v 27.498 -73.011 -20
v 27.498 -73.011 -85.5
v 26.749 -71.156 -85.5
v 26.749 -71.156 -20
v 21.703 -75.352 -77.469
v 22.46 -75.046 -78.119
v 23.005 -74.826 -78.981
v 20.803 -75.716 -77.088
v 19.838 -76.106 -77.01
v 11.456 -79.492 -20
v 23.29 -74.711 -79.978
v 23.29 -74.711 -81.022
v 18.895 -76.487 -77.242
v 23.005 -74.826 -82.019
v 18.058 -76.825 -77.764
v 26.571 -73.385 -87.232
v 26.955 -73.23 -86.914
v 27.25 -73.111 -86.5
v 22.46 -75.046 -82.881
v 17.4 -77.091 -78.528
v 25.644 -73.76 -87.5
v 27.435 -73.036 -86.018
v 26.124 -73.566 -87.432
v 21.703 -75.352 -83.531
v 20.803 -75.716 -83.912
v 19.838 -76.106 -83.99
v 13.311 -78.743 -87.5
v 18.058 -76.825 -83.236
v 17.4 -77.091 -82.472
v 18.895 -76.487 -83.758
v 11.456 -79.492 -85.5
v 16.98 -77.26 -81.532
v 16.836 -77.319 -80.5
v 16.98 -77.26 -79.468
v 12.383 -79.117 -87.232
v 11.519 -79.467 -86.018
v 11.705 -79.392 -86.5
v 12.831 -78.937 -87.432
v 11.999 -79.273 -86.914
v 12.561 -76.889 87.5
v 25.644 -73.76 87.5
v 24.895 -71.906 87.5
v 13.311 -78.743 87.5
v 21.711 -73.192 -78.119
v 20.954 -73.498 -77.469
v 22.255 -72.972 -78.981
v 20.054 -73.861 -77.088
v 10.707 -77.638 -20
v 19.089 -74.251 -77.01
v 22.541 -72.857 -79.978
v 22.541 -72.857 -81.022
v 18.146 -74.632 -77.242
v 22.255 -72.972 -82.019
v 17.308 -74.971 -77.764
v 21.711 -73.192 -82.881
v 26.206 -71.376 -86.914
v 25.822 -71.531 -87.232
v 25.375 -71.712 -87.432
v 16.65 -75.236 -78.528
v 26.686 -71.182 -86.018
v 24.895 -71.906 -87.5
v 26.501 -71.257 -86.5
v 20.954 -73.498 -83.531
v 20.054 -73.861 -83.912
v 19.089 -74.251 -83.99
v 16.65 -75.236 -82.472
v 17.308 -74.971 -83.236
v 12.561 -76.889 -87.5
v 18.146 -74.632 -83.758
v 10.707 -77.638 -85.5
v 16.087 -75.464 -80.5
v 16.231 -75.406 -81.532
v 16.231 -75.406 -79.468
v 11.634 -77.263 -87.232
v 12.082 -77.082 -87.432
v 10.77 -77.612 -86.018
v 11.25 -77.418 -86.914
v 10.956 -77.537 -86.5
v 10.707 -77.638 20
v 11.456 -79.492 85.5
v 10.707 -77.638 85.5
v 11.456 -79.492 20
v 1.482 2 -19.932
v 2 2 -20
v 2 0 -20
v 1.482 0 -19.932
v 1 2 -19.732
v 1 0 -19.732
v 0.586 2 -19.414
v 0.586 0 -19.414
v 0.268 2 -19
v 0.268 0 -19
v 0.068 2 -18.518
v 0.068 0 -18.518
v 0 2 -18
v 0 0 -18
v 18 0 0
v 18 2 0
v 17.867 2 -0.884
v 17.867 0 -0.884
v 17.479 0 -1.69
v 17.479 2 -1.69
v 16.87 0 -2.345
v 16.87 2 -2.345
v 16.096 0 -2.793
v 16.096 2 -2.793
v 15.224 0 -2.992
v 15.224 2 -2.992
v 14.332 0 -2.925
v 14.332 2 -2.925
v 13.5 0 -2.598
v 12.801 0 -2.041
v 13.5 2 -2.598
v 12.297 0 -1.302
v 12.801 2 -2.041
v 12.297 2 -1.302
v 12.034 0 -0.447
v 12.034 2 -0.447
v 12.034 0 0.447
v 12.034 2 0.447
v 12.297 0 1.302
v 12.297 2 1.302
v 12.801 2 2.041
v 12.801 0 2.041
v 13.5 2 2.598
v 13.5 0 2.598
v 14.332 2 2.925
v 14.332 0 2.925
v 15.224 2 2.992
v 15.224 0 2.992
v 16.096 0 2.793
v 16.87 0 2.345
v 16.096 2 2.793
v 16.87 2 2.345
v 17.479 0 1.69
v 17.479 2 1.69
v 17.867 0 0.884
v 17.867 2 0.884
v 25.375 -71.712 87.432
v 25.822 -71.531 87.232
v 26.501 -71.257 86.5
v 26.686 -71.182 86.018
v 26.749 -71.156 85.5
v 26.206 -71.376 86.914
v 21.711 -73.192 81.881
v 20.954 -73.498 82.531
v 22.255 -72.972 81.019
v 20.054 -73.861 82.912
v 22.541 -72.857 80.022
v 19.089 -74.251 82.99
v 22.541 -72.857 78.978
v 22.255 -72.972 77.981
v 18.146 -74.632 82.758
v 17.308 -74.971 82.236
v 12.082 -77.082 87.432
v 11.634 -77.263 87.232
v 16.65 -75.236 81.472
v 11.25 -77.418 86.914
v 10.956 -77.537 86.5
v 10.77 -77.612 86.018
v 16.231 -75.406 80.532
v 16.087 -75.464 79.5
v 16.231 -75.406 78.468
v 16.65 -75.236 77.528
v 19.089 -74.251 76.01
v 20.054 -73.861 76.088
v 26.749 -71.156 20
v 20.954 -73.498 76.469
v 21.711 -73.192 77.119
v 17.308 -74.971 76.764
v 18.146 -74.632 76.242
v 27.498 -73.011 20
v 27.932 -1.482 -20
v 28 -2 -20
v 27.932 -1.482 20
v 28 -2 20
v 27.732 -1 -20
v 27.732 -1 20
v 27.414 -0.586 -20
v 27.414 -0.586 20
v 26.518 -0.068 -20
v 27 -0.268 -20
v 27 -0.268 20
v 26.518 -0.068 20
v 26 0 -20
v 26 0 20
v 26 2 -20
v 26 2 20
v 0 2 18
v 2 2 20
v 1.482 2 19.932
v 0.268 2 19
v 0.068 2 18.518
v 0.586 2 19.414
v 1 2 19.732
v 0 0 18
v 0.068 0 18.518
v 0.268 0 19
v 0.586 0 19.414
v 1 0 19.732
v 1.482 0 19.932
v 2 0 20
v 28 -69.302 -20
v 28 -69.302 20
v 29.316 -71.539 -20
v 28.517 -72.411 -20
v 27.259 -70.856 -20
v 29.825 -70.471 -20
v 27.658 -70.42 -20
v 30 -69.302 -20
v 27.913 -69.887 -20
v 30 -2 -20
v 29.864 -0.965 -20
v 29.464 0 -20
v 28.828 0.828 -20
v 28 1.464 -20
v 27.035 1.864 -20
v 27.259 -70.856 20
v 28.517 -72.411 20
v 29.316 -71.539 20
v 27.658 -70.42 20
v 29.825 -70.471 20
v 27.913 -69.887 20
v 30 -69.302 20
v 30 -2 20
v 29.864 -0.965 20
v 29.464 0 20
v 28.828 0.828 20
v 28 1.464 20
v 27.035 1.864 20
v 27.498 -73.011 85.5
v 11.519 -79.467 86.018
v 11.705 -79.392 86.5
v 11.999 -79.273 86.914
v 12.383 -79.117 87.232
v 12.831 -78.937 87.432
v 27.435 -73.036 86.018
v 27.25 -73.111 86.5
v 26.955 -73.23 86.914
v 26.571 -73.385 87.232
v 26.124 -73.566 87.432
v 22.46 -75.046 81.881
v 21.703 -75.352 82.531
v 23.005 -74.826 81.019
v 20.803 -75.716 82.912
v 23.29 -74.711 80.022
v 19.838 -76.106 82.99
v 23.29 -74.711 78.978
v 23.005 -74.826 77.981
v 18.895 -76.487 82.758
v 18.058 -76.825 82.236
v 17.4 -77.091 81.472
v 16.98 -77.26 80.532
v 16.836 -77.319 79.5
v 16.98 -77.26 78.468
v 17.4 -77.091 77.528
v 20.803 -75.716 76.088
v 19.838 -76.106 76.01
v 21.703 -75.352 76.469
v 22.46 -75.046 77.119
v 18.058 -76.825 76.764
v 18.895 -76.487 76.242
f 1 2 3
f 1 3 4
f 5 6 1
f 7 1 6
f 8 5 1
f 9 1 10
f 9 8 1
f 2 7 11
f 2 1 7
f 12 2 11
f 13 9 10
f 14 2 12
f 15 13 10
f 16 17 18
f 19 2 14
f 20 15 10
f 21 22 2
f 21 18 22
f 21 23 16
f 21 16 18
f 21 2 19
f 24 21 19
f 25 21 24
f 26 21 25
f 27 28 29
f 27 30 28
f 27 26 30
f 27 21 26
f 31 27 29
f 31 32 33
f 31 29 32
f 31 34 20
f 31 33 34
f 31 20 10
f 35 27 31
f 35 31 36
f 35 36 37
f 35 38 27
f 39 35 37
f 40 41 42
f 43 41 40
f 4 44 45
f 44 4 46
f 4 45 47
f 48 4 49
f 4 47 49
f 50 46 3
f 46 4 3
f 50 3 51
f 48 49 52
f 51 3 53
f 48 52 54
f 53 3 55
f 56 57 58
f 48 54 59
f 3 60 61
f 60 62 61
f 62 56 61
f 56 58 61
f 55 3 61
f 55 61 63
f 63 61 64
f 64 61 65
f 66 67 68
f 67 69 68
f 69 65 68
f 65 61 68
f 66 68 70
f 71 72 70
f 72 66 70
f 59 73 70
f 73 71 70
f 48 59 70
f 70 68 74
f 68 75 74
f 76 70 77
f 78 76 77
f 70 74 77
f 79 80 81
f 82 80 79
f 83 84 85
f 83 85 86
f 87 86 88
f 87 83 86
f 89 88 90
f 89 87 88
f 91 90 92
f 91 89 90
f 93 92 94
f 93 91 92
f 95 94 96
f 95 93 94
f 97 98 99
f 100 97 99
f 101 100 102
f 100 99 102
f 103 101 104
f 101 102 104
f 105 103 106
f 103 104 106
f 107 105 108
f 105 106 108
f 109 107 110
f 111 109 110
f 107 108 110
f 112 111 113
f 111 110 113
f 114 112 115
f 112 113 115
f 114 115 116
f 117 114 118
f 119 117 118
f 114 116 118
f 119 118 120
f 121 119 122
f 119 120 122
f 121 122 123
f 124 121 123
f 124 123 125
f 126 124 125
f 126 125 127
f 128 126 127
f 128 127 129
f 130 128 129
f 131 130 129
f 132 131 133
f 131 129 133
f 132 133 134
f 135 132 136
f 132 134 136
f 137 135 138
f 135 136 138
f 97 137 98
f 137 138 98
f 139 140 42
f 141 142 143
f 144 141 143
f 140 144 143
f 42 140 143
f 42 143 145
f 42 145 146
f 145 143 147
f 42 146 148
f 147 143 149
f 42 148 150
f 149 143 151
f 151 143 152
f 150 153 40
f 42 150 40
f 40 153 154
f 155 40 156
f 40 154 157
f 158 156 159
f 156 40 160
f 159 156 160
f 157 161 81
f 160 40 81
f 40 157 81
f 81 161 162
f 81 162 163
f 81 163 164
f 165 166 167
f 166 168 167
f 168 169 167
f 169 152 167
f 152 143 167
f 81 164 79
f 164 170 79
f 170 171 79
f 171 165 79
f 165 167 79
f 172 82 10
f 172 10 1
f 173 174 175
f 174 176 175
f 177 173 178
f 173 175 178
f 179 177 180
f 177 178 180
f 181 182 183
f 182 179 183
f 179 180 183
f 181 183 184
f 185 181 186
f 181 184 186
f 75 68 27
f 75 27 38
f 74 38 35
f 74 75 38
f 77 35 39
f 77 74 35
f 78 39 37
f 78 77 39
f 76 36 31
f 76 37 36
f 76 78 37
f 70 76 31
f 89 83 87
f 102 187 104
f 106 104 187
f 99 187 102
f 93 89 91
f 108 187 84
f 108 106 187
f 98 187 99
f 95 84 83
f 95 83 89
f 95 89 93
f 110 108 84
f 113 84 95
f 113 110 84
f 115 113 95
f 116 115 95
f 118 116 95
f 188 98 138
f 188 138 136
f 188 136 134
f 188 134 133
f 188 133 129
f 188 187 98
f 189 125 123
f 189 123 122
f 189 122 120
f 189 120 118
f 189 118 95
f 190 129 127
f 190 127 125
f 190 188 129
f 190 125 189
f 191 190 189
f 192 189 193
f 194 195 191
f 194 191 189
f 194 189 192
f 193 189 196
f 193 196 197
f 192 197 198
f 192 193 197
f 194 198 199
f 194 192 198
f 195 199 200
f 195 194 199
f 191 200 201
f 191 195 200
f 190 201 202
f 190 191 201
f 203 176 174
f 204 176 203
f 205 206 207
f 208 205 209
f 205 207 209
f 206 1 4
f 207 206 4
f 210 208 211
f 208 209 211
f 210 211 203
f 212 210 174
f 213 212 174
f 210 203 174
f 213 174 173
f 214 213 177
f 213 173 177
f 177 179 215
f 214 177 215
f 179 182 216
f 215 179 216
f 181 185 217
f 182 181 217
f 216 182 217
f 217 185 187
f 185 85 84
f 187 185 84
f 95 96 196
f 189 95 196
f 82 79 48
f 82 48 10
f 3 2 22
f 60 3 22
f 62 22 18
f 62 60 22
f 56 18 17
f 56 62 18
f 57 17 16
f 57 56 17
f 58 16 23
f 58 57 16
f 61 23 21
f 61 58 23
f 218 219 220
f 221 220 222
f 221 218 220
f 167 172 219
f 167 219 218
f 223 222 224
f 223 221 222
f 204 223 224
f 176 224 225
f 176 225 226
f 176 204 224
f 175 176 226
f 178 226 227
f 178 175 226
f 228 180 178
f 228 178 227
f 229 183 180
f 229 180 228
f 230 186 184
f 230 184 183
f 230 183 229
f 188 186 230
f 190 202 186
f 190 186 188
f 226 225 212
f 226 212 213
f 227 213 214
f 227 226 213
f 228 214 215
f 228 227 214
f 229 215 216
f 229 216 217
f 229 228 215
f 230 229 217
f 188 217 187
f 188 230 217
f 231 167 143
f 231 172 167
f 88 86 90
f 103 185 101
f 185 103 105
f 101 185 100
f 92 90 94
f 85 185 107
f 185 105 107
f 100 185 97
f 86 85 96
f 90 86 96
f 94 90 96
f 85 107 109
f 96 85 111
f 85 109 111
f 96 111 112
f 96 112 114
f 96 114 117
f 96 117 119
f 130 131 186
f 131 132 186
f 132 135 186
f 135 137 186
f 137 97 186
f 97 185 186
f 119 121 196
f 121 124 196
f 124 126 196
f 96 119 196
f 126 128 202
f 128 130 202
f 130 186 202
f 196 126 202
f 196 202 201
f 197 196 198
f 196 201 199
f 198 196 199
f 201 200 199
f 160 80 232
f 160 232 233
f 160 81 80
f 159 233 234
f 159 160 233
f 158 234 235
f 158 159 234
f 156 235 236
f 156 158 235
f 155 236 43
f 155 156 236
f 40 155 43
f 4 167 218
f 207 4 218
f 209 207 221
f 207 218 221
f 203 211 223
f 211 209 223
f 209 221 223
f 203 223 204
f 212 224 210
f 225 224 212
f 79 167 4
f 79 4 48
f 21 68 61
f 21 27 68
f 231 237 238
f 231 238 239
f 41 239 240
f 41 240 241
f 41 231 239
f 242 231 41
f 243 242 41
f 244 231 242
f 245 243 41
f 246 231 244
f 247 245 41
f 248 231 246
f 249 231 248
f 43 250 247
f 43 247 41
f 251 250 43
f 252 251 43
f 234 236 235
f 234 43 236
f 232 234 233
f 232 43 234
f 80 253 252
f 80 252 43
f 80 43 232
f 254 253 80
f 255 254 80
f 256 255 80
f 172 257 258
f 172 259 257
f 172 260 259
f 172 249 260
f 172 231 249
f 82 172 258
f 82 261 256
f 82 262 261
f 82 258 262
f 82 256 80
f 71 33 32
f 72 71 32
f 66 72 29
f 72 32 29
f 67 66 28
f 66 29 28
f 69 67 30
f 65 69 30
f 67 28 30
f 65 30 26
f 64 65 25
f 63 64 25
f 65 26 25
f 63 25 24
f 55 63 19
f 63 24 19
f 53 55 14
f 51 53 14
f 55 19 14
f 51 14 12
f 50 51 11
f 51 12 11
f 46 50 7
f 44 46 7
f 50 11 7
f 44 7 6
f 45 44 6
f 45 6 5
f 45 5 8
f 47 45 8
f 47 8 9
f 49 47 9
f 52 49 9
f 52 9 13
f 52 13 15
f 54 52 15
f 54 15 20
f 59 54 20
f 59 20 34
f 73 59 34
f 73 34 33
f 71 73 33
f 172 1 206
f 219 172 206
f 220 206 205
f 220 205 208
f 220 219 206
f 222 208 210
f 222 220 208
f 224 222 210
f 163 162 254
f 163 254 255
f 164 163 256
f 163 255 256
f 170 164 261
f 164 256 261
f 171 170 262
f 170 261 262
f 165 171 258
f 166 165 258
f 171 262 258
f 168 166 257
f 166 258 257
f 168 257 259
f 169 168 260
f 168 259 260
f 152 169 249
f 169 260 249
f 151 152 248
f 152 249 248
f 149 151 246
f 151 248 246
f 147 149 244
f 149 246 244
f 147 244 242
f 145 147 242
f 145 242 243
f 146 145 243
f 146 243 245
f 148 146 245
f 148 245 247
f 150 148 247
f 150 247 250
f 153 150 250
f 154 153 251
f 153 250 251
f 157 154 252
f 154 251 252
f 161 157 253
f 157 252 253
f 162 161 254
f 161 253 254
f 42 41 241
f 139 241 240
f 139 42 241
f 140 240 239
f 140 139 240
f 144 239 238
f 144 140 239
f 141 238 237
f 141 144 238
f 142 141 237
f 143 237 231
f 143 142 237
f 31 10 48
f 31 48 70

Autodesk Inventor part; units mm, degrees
ref_plane "YZ Plane" through (0, 0, 0) normal (1, 0, 0) x (0, 1, 0)
ref_plane "XZ Plane" through (0, 0, 0) normal (0, 1, 0) x (-1, 0, 0)
ref_plane "XY Plane" through (0, 0, 0) normal (0, 0, 1) x (1, 0, 0)
sketch "Sketch1" plane through (0, 0, 0) normal (0, 1, 0) x (-1, 0, 0)
  line L0 (0, 20) -> (-30, 20)
  line L1 (-30, 20) -> (-30, -20)
  line L2 (-30, -20) -> (0, -20)
  line L3 (0, -20) -> (0, 20)
  point P0 (0, 0)
  dimension "d0" = 20
  dimension "d1" = 20
  dimension "d2" = 0
  dimension "d3" = 30
extrude "Plate1" add sketch "Sketch1" along normal blind 2
sketch "Sketch2" plane through (28, 2, -20) normal (1, 0, 0) x (0, -1, 0)
  line L0 (0, 40) -> (0, 0)
  line L1 (0, 0) -> (74, 0)
  line L2 (74, 0) -> (74, 40)
  line L3 (74, 40) -> (0, 40)
edge flange "Flange1" height 74 angle -90 thickness 2 bend radius 2 thickness toward (1, 0, 0) relief tear relief width 2 relief depth 1 edges at (30, 2, 0) wall of the first edge with corners at (28, 2, 20) (28, 2, -20) (28, -72, -20) (28, -72, 20)
bend "Bend1"
corner "Corner1"
sketch "Sketch3" plane through (29.2508, -70.1456, 20) normal (0.3746066, -0.9271839, 0) x (0.9271839, 0.3746066, 0)
  line L0 (0, -40) -> (0, 0)
  line L1 (0, 0) -> (-20, 0)
  line L2 (-20, 0) -> (-20, -40)
  line L3 (-20, -40) -> (0, -40)
edge flange "Flange2" height 20 angle 68 thickness 2 bend radius 2 thickness toward (0.3746066, -0.9271839, 0) relief tear relief width 2 relief depth 1 edges at (28, -72, 0) wall of the first edge with corners at (29.2508, -70.1456, -20) (29.2508, -70.1456, 20) (10.7071, -77.6378, 20) (10.7071, -77.6378, -20)
bend "Bend2"
corner "Corner2"
sketch "Sketch4" plane through (11.4563, -79.4921, 20) normal (0.3746066, -0.9271839, 0) x (-0.9271839, -0.3746066, 0)
  line L0 (-17.302, 40) -> (-17.302, 0) projected
  line L1 (0, 0) -> (-17.302, 0) projected
  line L2 (0, 40) -> (0, 0) projected
  line L3 (-17.302, 40) -> (0, 40) projected
  line L4 (-17.302, -67.5) -> (0, -67.5)
  line L5 (0, -67.5) -> (0, 107.5)
  line L6 (0, 107.5) -> (-17.302, 107.5)
  line L7 (-17.302, 107.5) -> (-17.302, -67.5)
  point P0 (-19.1562, 20)
  dimension "d26" = 87.5
  dimension "d27" = 87.5
  dimension "d28" = 0
  dimension "d30" = 0
extrude "Extrusion1" add sketch "Sketch4" against normal blind 2 contours L7 L6 L5 L3 | L1 L5 L4 L7
sketch "Sketch5" plane through (0, 2, 0) normal (0, 1, 0) x (1, 0, 0)
  circle A0 centre (15, 0) radius 3
  line L0 (36, 0) -> (-6, 0) projected
  point P0 (0, 0)
  dimension "d51" = 6
  dimension "d52" = 0
  dimension "d53" = 15
extrude "Extrusion2" cut sketch "Sketch5" against normal blind 2
sketch "Sketch6" plane through (27.4984, -73.0107, 87.5) normal (0.3746066, -0.9271839, 0) x (-0.9271839, -0.3746066, 0)
  circle A0 centre (8, 8) radius 3.5
  line L0 (0, 107.5) -> (0, 67.5) projected
  line L1 (0, 67.5) -> (0, 0) projected
  line L2 (0, 0) -> (17.302, 0) projected
  line L3 (17.302, 0) -> (17.302, 175) projected
  line L4 (17.302, 175) -> (0, 175) projected
  line L5 (0, 175) -> (0, 107.5) projected
  circle A1 centre (8, 168) radius 3.5
  point P0 (-1.8542, 87.5)
  dimension "d38" = 7
  dimension "d39" = 8
  dimension "d40" = 8
  dimension "d43" = 160
extrude "Extrusion3" cut sketch "Sketch6" against normal blind 2 contours A0 | A1
fillet "Fillet1" radius 2 6 edges at (0, 1, 20) (0, 1, -20) (11.0817, -78.5649, 87.5) (27.1238, -72.0835, 87.5) (11.0817, -78.5649, -87.5) (27.1238, -72.0835, -87.5)
equation "\"d4\" = Thickness"
equation "\"d5\" = BendReliefWidth"
equation "\"d6\" = BendReliefDepth"
equation "\"d7\" = MinimumRemnant"
equation "\"d8\" = TransitionRadius"
equation "\"d11\" = BendRadius"
equation "\"d12\" = CornerReliefSize"
equation "\"d13\" = GapSize"
equation "\"d14\" = JacobiRadiusSize"
equation "\"d15\" = BendReliefWidth"
equation "\"d16\" = BendReliefDepth"
equation "\"d17\" = MinimumRemnant"
equation "\"d18\" = TransitionRadius"
equation "\"d21\" = BendRadius"
equation "\"d22\" = CornerReliefSize"
equation "\"d23\" = GapSize"
equation "\"d24\" = JacobiRadiusSize"
equation "\"d27\" = d26"
equation "\"d1\" = d0"
equation "\"BendRadius\" = Thickness"
equation "\"BendReliefWidth\" = Thickness"
equation "\"BendReliefDepth\" = 0.5 * Thickness"
equation "\"CornerReliefSize\" = 4 * Thickness"
equation "\"MinimumRemnant\" = 2 * Thickness"
equation "\"TransitionRadius\" = BendRadius"
equation "\"JacobiRadiusSize\" = BendRadius"
equation "\"GapSize\" = Thickness"
equation "\"Thickness\" = 2"
properties part number "Bottom Mount" material "Stainless Steel"
